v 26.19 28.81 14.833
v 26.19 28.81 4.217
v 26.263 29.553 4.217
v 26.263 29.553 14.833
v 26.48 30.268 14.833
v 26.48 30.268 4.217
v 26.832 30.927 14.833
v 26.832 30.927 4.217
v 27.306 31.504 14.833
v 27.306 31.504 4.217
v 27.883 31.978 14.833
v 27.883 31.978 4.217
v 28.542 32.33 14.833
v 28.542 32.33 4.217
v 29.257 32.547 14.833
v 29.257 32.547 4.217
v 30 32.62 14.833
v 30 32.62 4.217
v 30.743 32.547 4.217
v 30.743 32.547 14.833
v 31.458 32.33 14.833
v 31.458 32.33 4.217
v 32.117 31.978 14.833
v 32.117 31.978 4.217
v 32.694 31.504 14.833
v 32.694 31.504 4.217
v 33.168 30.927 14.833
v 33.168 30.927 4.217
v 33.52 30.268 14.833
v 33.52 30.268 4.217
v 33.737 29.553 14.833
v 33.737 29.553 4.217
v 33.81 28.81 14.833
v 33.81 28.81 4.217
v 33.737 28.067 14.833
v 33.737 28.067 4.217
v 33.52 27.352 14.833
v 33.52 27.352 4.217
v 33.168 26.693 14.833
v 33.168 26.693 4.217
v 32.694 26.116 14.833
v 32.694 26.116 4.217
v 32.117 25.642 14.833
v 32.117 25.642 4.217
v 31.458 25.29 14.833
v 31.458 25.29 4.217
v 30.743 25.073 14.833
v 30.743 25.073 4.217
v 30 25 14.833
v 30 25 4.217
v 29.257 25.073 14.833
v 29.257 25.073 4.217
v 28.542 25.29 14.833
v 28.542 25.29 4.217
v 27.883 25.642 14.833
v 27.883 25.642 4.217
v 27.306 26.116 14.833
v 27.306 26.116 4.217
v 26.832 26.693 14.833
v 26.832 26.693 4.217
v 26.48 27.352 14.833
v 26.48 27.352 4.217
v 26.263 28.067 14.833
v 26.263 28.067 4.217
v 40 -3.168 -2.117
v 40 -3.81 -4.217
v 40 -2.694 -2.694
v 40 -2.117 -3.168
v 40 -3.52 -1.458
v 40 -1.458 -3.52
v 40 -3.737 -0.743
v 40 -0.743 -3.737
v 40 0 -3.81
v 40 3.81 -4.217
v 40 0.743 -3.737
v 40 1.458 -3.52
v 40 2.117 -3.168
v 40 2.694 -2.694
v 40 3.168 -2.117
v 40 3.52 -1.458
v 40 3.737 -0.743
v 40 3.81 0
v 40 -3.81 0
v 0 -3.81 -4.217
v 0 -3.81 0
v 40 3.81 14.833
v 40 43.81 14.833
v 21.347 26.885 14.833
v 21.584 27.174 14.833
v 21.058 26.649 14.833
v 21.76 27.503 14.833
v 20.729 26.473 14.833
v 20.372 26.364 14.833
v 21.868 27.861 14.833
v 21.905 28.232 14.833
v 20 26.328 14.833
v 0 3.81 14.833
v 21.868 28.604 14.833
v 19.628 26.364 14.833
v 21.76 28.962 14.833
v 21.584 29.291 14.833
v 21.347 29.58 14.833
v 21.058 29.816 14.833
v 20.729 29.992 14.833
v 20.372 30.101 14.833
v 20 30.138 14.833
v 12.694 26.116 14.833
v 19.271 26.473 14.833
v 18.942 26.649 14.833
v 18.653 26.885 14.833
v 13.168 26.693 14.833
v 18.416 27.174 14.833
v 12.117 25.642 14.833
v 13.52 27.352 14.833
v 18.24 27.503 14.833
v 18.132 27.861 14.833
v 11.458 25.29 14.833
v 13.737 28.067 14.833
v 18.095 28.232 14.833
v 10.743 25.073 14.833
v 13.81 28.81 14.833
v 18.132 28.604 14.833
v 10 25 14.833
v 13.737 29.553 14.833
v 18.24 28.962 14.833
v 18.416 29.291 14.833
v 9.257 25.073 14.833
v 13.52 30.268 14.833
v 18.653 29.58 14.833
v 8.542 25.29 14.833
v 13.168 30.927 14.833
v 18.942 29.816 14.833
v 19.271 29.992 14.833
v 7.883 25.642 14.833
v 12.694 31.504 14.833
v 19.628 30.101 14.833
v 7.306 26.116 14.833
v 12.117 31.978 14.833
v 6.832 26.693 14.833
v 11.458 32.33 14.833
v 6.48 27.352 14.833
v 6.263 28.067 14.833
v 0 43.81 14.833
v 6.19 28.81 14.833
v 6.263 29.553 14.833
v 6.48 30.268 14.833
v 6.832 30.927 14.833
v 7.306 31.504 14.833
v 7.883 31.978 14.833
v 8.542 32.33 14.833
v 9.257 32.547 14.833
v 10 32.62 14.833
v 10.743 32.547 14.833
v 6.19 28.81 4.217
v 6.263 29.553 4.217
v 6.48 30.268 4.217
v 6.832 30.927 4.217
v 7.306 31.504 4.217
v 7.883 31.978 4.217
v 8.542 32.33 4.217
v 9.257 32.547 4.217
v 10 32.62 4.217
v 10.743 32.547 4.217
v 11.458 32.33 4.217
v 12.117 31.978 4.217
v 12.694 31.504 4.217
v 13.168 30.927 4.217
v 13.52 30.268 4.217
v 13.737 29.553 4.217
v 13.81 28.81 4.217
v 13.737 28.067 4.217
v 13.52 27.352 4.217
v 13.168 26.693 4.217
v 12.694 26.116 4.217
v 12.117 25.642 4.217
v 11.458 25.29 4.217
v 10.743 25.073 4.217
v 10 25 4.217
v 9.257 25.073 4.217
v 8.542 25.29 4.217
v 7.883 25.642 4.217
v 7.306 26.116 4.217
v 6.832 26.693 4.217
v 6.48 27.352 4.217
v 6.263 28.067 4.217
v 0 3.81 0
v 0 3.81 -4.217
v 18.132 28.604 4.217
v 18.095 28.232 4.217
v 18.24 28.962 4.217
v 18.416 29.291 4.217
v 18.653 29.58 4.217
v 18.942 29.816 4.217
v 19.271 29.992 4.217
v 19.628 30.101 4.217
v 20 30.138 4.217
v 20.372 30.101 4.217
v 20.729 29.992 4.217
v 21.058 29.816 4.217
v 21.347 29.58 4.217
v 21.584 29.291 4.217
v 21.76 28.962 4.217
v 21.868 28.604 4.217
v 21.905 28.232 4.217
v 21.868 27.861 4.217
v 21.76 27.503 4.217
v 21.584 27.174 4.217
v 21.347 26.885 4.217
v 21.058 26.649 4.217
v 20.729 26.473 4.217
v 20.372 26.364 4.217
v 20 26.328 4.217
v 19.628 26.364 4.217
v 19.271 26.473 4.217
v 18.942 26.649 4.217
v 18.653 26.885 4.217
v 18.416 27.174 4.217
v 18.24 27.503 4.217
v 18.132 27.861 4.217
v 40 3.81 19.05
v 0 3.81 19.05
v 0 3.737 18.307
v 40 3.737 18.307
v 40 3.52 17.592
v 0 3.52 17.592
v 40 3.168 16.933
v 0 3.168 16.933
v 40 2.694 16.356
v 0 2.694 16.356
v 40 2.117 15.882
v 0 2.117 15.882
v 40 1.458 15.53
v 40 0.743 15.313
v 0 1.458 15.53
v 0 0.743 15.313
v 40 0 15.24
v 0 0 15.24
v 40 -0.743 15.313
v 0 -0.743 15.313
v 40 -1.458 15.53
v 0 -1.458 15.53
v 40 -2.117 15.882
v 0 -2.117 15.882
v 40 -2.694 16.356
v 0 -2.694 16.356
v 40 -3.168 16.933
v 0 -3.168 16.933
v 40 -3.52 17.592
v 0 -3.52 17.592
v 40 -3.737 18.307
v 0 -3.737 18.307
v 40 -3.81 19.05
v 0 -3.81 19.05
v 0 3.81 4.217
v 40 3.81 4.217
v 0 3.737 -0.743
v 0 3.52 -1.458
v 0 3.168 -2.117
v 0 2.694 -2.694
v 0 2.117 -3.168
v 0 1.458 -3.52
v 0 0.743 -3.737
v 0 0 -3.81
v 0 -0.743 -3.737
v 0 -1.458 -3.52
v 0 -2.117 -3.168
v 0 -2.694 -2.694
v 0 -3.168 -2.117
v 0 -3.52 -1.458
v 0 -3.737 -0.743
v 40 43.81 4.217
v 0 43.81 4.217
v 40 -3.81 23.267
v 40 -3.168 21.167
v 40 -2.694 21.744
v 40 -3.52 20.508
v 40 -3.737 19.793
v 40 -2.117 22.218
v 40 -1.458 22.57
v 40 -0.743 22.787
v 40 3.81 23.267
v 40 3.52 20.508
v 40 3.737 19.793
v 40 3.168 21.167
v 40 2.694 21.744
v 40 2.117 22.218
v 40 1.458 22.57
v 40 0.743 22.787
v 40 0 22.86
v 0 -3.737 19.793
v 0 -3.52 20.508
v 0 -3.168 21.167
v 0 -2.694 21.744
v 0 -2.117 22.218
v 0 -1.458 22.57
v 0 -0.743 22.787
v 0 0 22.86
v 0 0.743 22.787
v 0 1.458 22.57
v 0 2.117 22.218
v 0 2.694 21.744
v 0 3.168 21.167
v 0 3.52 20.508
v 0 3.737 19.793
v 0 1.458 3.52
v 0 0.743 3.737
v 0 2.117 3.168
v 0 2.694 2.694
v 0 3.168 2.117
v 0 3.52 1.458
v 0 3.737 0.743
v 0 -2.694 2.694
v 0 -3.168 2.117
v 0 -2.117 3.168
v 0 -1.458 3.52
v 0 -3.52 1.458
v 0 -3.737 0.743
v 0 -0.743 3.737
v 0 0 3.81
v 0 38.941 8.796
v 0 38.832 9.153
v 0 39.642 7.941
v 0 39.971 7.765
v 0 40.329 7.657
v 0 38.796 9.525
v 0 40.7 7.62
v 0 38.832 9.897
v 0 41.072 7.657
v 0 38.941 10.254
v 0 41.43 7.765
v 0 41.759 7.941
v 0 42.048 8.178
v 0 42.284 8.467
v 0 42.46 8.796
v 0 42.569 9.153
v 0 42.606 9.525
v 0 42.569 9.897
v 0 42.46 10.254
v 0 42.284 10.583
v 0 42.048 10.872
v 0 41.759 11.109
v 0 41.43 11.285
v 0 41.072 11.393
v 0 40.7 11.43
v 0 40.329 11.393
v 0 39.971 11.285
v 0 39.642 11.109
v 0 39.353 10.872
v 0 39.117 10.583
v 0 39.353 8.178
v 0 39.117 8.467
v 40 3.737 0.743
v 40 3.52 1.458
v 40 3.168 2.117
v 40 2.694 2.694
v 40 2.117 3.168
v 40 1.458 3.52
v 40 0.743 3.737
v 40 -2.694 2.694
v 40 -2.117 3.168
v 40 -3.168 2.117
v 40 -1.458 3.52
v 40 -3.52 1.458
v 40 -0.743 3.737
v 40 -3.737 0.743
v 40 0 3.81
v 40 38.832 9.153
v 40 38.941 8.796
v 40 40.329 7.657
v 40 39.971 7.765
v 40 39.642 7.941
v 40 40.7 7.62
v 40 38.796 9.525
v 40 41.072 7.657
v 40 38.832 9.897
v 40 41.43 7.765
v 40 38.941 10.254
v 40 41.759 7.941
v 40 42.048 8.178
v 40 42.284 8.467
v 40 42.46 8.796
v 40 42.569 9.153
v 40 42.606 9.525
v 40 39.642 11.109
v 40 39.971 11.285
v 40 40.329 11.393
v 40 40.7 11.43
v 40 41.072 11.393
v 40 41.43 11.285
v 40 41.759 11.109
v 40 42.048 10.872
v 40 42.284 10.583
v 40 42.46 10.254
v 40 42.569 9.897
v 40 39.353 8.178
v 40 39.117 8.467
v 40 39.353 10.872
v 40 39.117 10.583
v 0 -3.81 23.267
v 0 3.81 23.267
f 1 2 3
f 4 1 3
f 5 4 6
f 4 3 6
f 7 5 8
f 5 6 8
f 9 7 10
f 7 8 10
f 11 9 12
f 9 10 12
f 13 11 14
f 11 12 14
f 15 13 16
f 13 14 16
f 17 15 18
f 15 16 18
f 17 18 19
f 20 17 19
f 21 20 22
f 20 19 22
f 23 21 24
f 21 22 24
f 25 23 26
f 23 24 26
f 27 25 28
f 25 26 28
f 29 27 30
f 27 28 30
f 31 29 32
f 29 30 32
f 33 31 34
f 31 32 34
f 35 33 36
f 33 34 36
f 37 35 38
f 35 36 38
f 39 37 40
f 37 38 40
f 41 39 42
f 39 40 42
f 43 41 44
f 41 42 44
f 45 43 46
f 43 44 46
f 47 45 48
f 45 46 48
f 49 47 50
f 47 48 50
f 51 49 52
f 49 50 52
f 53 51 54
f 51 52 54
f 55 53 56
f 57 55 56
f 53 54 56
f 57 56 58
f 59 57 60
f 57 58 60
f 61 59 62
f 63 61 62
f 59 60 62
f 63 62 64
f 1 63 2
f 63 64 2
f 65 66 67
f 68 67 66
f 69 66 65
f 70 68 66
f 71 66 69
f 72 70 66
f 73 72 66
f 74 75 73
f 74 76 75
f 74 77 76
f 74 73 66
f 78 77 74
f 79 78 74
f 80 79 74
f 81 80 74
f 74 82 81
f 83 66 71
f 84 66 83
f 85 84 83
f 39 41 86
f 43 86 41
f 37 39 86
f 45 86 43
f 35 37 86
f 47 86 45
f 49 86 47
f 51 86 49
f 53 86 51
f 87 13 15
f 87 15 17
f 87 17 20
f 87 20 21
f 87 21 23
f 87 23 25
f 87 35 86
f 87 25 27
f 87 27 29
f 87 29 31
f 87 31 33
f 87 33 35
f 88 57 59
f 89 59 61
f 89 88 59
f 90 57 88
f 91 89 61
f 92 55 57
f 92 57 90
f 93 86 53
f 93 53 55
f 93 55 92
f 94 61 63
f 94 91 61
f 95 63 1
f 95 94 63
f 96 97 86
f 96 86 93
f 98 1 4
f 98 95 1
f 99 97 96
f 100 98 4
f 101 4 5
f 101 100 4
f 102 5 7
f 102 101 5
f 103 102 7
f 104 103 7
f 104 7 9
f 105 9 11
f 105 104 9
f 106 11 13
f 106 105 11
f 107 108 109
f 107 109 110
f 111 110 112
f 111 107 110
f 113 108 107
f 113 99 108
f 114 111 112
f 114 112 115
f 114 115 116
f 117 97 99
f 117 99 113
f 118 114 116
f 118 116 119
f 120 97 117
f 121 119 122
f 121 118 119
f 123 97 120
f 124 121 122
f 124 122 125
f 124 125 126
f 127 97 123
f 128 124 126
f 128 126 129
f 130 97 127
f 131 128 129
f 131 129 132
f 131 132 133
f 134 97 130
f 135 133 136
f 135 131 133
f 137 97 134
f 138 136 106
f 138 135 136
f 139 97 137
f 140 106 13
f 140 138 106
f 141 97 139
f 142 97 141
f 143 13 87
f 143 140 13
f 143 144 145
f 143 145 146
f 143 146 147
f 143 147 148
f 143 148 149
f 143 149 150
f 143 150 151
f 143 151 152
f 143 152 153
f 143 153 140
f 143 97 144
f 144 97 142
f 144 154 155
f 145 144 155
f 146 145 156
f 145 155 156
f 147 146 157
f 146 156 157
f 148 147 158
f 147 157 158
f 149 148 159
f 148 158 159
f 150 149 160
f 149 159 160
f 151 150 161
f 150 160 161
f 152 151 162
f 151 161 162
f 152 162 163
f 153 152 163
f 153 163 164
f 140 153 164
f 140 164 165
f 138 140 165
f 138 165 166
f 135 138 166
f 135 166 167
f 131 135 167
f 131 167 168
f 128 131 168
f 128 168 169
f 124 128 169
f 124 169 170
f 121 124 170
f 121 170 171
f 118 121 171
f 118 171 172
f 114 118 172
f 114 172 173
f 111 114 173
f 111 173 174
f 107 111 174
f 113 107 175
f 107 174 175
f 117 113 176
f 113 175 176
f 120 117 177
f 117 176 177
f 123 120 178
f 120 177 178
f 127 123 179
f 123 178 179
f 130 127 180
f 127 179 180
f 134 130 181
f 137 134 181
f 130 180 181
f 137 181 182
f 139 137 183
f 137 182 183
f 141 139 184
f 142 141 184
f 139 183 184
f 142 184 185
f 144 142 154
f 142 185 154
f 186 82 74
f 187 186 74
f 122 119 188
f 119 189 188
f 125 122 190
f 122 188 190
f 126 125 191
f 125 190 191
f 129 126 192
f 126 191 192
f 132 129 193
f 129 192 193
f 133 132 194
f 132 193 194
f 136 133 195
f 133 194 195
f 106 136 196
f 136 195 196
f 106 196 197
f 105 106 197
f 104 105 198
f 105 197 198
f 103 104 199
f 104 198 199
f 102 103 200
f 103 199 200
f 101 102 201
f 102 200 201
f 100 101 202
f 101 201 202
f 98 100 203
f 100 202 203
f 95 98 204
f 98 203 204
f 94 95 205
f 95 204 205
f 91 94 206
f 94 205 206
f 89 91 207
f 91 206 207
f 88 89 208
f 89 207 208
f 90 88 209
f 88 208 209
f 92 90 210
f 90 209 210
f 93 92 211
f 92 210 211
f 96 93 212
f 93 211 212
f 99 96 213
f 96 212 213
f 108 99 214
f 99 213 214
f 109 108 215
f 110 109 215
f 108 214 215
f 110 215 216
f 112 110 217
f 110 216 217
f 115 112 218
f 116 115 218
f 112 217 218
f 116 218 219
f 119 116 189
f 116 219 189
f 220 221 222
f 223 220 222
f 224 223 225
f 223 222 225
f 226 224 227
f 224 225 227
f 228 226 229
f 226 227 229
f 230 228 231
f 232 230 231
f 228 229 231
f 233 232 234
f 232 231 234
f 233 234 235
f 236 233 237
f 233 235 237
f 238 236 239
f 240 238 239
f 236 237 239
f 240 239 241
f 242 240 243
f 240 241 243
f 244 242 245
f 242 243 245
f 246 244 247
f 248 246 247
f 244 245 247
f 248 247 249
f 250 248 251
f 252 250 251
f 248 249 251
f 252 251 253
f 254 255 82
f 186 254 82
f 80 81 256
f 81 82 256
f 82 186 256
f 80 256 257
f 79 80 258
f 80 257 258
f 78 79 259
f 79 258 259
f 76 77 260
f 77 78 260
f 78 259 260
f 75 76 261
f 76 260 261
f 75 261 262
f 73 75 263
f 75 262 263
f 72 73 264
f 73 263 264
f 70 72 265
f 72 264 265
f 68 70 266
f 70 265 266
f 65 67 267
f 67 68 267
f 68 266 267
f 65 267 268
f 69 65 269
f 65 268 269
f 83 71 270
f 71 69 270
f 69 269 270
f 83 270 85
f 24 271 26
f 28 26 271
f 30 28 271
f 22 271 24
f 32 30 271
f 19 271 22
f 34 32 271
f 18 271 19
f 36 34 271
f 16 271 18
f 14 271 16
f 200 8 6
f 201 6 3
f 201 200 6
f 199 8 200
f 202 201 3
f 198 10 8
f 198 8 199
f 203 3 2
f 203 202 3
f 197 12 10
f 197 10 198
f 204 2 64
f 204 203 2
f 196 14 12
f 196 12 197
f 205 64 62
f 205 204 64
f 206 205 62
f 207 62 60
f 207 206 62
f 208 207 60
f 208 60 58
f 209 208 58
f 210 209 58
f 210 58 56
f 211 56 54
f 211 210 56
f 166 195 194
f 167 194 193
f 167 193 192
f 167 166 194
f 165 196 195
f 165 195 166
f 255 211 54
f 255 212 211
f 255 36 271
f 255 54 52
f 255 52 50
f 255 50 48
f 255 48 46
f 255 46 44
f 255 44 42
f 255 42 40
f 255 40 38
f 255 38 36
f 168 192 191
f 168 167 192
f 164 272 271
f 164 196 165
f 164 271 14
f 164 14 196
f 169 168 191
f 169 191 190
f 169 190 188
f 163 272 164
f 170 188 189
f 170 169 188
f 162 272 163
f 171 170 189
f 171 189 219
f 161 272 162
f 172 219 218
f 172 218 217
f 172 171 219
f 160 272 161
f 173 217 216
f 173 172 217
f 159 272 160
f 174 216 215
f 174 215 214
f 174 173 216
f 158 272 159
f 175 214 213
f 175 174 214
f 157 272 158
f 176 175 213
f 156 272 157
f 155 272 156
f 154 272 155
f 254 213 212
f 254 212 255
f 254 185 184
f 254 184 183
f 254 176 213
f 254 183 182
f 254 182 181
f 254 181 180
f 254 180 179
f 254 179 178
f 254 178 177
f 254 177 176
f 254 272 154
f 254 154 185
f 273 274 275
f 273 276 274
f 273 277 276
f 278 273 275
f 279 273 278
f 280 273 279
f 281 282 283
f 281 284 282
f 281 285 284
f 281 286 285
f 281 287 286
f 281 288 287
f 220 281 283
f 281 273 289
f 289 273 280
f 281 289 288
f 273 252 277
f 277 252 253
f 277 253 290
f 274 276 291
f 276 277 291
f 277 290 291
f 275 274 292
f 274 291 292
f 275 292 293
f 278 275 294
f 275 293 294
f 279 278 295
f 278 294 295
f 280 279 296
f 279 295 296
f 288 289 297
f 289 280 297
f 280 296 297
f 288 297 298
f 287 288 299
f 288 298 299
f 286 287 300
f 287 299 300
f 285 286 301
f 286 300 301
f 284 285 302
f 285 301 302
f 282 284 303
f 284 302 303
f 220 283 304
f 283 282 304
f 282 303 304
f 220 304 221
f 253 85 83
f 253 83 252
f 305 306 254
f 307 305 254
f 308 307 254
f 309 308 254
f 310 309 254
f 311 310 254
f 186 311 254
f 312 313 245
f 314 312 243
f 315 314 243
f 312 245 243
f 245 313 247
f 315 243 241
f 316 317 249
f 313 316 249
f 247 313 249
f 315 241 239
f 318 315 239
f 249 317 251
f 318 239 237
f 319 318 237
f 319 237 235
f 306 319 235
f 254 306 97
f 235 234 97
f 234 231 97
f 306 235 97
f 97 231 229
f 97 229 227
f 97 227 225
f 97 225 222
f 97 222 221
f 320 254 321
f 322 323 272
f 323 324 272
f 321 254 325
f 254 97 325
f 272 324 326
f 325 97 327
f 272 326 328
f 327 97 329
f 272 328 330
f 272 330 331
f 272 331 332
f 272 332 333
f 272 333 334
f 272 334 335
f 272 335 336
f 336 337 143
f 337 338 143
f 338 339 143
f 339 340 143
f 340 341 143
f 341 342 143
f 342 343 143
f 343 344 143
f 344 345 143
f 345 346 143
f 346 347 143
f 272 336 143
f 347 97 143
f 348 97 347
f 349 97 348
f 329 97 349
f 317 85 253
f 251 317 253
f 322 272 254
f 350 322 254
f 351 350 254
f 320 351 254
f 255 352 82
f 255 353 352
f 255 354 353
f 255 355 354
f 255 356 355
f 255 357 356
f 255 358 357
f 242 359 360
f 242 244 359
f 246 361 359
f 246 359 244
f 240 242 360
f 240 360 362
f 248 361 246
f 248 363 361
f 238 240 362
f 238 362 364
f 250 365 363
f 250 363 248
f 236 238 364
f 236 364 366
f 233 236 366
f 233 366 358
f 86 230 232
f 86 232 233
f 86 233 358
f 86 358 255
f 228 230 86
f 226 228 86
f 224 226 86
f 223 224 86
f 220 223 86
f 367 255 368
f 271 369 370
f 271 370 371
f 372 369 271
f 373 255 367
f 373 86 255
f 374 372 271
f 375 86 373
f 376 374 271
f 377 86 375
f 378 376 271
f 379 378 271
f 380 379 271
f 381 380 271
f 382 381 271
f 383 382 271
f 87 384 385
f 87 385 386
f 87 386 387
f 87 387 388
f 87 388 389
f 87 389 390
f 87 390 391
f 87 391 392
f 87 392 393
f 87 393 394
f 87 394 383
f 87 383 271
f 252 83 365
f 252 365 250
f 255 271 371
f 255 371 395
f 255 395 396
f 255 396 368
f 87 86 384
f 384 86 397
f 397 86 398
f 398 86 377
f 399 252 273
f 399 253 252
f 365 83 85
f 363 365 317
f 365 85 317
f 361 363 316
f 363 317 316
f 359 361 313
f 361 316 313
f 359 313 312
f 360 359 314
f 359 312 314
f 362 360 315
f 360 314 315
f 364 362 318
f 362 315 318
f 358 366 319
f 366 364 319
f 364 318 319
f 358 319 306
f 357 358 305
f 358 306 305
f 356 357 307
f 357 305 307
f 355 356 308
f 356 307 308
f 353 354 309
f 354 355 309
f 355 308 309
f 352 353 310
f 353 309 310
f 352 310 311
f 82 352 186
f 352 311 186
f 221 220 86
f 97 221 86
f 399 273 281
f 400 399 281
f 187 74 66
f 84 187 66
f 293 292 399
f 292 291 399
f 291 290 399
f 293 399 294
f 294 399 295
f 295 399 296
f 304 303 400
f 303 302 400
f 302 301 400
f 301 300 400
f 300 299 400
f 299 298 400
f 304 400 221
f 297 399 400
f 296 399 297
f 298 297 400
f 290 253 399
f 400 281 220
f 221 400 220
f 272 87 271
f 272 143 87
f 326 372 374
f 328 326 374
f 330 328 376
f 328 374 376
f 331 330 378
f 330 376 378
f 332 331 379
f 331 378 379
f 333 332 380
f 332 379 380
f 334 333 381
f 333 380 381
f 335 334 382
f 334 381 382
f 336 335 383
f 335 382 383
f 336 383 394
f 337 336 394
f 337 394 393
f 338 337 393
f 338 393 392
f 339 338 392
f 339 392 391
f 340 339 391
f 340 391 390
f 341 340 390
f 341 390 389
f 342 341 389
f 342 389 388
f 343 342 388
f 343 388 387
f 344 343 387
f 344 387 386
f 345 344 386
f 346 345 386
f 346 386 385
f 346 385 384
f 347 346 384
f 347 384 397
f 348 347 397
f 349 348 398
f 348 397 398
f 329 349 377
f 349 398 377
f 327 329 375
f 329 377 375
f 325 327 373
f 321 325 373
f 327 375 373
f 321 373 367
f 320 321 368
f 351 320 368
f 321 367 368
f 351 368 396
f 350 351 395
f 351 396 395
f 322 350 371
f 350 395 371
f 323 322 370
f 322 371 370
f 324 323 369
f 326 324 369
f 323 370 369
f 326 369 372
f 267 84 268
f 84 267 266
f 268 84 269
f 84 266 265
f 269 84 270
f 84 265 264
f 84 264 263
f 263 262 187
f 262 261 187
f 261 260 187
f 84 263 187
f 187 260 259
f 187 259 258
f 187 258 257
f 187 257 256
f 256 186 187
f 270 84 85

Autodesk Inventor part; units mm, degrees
ref_plane "YZ Plane" through (0, 0, 0) normal (1, 0, 0) x (0, 1, 0)
ref_plane "XZ Plane" through (0, 0, 0) normal (0, 1, 0) x (-1, 0, 0)
ref_plane "XY Plane" through (0, 0, 0) normal (0, 0, 1) x (1, 0, 0)
sketch "Sketch2" plane through (0, 0, 0) normal (1, 0, 0) x (0, 1, 0)
  circle A0 centre (0, 0) radius 3.81
  line L0 (-3.81, 4.2173) -> (3.81, 4.2173)
  line L1 (3.81, 4.2173) -> (3.81, -4.2173)
  line L2 (3.81, -4.2173) -> (-3.81, -4.2173)
  line L3 (-3.81, -4.2173) -> (-3.81, 4.2173)
  line L4 (-3.81, 4.2173) -> (3.81, -4.2173) construction
  line L5 (3.81, 4.2173) -> (-3.81, -4.2173) construction
  circle A1 centre (0, 19.05) radius 3.81
  line L6 (-3.81, 23.2673) -> (3.81, 23.2673)
  line L7 (3.81, 23.2673) -> (3.81, 14.8327)
  line L8 (3.81, 14.8327) -> (-3.81, 14.8327)
  line L9 (-3.81, 14.8327) -> (-3.81, 23.2673)
  line L10 (-3.81, 23.2673) -> (3.81, 14.8327) construction
  line L11 (3.81, 23.2673) -> (-3.81, 14.8327) construction
  line L12 (0, 0) -> (0, 19.05)
  line L13 (-3.81, 14.8327) -> (-3.81, 4.2173)
  line L14 (3.81, 14.8327) -> (3.81, 4.2173)
  line L15 (3.81, 14.8327) -> (43.81, 14.8327)
  line L16 (43.81, 14.8327) -> (43.81, 4.2173)
  line L17 (43.81, 4.2173) -> (3.81, 4.2173)
  dimension "d42" = 7.62
  dimension "d43" = 42.096
  dimension "d46" = 7.62
  dimension "d47" = 42.096
  dimension "d48" = 19.05
  dimension "d49" = 40
extrude "Extrusion6" add sketch "Sketch2" along normal blind 40 contours L1 L2 L3 A0 | A0 L12 L0 L1 | A0 L3 L0 L12 | L0 L12 L8 L14 | L14 L15 L16 L17 | L0 L13 L8 L12 | L8 L12 A1 L7 | L8 L9 A1 L12 | A1 L9 L6 L7
sketch "Sketch3" plane through (0, 3.81, 4.2173) normal (0, 0, -1) x (-1, 0, 0)
  line L0 (0, 40) -> (-40, 40) projected
  line L1 (0, 0) -> (0, 40) projected
  line L2 (-40, 40) -> (0, 40)
  line L3 (0, 40) -> (0, 0)
  line L4 (0, 0) -> (-40, 0)
  line L5 (-40, 0) -> (-40, 40)
  line L6 (-40, 40) -> (0, 0)
  line L7 (0, 0) -> (-40, 0) projected
  line L8 (-40, 0) -> (0, 40)
  line L9 (-20, 30) -> (-40, 20)
  line L10 (-40, 0) -> (-40, 40) projected
  line L11 (-20, 30) -> (0, 20)
  circle A0 centre (-30, 25) radius 3.81
  circle A1 centre (-10, 25) radius 3.81
  line L12 (-20, 40) -> (-20, 0)
  line L13 (0, 0) -> (-40, 0) projected
  circle A2 centre (-20, 24.4225) radius 1.905
  point P0 (0, -3.81)
  dimension "d51" = 10
  dimension "d52" = 20
  dimension "d55" = 7.62
  dimension "d56" = 7.62
  dimension "d57" = 3.81
  dimension "d58" = 15.5776
extrude "Extrusion7" cut sketch "Sketch3" against normal blind 40 contours A1 L11 L8 | L8 L11 A1 | A1 L8 L11 | L8 A1 L11 | A0 L9 L6 | L6 L9 A0 | A0 L6 L9 | A2 L12 | L12 A2 | L9 L6 A0
thread "Thread6" size "M1x0.25" class "6H" standard "ISO Metric profile" full length
sketch "Sketch4" plane through (40, 0, 0) normal (1, 0, 0) x (0, 0, -1)
  line L0 (-14.8327, 3.81) -> (-4.2173, 3.81)
  line L1 (-4.2173, 3.81) -> (-4.2173, 43.81)
  line L2 (-4.2173, 43.81) -> (-14.8327, 43.81)
  line L3 (-14.8327, 43.81) -> (-14.8327, 3.81)
  line L4 (-9.525, 3.81) -> (-9.525, 43.81)
  circle A0 centre (-9.525, 40.7005) radius 1.905
  point P0 (0, 0)
  point P1 (-9.525, 13.81)
  dimension "d61" = 3.81
extrude "Extrusion8" cut sketch "Sketch4" against normal blind 150 contours A0 L4 | L4 A0
thread "Thread7" size "M1x0.25" class "6H" standard "ISO Metric profile" full length
properties part number "coulissant coté"
